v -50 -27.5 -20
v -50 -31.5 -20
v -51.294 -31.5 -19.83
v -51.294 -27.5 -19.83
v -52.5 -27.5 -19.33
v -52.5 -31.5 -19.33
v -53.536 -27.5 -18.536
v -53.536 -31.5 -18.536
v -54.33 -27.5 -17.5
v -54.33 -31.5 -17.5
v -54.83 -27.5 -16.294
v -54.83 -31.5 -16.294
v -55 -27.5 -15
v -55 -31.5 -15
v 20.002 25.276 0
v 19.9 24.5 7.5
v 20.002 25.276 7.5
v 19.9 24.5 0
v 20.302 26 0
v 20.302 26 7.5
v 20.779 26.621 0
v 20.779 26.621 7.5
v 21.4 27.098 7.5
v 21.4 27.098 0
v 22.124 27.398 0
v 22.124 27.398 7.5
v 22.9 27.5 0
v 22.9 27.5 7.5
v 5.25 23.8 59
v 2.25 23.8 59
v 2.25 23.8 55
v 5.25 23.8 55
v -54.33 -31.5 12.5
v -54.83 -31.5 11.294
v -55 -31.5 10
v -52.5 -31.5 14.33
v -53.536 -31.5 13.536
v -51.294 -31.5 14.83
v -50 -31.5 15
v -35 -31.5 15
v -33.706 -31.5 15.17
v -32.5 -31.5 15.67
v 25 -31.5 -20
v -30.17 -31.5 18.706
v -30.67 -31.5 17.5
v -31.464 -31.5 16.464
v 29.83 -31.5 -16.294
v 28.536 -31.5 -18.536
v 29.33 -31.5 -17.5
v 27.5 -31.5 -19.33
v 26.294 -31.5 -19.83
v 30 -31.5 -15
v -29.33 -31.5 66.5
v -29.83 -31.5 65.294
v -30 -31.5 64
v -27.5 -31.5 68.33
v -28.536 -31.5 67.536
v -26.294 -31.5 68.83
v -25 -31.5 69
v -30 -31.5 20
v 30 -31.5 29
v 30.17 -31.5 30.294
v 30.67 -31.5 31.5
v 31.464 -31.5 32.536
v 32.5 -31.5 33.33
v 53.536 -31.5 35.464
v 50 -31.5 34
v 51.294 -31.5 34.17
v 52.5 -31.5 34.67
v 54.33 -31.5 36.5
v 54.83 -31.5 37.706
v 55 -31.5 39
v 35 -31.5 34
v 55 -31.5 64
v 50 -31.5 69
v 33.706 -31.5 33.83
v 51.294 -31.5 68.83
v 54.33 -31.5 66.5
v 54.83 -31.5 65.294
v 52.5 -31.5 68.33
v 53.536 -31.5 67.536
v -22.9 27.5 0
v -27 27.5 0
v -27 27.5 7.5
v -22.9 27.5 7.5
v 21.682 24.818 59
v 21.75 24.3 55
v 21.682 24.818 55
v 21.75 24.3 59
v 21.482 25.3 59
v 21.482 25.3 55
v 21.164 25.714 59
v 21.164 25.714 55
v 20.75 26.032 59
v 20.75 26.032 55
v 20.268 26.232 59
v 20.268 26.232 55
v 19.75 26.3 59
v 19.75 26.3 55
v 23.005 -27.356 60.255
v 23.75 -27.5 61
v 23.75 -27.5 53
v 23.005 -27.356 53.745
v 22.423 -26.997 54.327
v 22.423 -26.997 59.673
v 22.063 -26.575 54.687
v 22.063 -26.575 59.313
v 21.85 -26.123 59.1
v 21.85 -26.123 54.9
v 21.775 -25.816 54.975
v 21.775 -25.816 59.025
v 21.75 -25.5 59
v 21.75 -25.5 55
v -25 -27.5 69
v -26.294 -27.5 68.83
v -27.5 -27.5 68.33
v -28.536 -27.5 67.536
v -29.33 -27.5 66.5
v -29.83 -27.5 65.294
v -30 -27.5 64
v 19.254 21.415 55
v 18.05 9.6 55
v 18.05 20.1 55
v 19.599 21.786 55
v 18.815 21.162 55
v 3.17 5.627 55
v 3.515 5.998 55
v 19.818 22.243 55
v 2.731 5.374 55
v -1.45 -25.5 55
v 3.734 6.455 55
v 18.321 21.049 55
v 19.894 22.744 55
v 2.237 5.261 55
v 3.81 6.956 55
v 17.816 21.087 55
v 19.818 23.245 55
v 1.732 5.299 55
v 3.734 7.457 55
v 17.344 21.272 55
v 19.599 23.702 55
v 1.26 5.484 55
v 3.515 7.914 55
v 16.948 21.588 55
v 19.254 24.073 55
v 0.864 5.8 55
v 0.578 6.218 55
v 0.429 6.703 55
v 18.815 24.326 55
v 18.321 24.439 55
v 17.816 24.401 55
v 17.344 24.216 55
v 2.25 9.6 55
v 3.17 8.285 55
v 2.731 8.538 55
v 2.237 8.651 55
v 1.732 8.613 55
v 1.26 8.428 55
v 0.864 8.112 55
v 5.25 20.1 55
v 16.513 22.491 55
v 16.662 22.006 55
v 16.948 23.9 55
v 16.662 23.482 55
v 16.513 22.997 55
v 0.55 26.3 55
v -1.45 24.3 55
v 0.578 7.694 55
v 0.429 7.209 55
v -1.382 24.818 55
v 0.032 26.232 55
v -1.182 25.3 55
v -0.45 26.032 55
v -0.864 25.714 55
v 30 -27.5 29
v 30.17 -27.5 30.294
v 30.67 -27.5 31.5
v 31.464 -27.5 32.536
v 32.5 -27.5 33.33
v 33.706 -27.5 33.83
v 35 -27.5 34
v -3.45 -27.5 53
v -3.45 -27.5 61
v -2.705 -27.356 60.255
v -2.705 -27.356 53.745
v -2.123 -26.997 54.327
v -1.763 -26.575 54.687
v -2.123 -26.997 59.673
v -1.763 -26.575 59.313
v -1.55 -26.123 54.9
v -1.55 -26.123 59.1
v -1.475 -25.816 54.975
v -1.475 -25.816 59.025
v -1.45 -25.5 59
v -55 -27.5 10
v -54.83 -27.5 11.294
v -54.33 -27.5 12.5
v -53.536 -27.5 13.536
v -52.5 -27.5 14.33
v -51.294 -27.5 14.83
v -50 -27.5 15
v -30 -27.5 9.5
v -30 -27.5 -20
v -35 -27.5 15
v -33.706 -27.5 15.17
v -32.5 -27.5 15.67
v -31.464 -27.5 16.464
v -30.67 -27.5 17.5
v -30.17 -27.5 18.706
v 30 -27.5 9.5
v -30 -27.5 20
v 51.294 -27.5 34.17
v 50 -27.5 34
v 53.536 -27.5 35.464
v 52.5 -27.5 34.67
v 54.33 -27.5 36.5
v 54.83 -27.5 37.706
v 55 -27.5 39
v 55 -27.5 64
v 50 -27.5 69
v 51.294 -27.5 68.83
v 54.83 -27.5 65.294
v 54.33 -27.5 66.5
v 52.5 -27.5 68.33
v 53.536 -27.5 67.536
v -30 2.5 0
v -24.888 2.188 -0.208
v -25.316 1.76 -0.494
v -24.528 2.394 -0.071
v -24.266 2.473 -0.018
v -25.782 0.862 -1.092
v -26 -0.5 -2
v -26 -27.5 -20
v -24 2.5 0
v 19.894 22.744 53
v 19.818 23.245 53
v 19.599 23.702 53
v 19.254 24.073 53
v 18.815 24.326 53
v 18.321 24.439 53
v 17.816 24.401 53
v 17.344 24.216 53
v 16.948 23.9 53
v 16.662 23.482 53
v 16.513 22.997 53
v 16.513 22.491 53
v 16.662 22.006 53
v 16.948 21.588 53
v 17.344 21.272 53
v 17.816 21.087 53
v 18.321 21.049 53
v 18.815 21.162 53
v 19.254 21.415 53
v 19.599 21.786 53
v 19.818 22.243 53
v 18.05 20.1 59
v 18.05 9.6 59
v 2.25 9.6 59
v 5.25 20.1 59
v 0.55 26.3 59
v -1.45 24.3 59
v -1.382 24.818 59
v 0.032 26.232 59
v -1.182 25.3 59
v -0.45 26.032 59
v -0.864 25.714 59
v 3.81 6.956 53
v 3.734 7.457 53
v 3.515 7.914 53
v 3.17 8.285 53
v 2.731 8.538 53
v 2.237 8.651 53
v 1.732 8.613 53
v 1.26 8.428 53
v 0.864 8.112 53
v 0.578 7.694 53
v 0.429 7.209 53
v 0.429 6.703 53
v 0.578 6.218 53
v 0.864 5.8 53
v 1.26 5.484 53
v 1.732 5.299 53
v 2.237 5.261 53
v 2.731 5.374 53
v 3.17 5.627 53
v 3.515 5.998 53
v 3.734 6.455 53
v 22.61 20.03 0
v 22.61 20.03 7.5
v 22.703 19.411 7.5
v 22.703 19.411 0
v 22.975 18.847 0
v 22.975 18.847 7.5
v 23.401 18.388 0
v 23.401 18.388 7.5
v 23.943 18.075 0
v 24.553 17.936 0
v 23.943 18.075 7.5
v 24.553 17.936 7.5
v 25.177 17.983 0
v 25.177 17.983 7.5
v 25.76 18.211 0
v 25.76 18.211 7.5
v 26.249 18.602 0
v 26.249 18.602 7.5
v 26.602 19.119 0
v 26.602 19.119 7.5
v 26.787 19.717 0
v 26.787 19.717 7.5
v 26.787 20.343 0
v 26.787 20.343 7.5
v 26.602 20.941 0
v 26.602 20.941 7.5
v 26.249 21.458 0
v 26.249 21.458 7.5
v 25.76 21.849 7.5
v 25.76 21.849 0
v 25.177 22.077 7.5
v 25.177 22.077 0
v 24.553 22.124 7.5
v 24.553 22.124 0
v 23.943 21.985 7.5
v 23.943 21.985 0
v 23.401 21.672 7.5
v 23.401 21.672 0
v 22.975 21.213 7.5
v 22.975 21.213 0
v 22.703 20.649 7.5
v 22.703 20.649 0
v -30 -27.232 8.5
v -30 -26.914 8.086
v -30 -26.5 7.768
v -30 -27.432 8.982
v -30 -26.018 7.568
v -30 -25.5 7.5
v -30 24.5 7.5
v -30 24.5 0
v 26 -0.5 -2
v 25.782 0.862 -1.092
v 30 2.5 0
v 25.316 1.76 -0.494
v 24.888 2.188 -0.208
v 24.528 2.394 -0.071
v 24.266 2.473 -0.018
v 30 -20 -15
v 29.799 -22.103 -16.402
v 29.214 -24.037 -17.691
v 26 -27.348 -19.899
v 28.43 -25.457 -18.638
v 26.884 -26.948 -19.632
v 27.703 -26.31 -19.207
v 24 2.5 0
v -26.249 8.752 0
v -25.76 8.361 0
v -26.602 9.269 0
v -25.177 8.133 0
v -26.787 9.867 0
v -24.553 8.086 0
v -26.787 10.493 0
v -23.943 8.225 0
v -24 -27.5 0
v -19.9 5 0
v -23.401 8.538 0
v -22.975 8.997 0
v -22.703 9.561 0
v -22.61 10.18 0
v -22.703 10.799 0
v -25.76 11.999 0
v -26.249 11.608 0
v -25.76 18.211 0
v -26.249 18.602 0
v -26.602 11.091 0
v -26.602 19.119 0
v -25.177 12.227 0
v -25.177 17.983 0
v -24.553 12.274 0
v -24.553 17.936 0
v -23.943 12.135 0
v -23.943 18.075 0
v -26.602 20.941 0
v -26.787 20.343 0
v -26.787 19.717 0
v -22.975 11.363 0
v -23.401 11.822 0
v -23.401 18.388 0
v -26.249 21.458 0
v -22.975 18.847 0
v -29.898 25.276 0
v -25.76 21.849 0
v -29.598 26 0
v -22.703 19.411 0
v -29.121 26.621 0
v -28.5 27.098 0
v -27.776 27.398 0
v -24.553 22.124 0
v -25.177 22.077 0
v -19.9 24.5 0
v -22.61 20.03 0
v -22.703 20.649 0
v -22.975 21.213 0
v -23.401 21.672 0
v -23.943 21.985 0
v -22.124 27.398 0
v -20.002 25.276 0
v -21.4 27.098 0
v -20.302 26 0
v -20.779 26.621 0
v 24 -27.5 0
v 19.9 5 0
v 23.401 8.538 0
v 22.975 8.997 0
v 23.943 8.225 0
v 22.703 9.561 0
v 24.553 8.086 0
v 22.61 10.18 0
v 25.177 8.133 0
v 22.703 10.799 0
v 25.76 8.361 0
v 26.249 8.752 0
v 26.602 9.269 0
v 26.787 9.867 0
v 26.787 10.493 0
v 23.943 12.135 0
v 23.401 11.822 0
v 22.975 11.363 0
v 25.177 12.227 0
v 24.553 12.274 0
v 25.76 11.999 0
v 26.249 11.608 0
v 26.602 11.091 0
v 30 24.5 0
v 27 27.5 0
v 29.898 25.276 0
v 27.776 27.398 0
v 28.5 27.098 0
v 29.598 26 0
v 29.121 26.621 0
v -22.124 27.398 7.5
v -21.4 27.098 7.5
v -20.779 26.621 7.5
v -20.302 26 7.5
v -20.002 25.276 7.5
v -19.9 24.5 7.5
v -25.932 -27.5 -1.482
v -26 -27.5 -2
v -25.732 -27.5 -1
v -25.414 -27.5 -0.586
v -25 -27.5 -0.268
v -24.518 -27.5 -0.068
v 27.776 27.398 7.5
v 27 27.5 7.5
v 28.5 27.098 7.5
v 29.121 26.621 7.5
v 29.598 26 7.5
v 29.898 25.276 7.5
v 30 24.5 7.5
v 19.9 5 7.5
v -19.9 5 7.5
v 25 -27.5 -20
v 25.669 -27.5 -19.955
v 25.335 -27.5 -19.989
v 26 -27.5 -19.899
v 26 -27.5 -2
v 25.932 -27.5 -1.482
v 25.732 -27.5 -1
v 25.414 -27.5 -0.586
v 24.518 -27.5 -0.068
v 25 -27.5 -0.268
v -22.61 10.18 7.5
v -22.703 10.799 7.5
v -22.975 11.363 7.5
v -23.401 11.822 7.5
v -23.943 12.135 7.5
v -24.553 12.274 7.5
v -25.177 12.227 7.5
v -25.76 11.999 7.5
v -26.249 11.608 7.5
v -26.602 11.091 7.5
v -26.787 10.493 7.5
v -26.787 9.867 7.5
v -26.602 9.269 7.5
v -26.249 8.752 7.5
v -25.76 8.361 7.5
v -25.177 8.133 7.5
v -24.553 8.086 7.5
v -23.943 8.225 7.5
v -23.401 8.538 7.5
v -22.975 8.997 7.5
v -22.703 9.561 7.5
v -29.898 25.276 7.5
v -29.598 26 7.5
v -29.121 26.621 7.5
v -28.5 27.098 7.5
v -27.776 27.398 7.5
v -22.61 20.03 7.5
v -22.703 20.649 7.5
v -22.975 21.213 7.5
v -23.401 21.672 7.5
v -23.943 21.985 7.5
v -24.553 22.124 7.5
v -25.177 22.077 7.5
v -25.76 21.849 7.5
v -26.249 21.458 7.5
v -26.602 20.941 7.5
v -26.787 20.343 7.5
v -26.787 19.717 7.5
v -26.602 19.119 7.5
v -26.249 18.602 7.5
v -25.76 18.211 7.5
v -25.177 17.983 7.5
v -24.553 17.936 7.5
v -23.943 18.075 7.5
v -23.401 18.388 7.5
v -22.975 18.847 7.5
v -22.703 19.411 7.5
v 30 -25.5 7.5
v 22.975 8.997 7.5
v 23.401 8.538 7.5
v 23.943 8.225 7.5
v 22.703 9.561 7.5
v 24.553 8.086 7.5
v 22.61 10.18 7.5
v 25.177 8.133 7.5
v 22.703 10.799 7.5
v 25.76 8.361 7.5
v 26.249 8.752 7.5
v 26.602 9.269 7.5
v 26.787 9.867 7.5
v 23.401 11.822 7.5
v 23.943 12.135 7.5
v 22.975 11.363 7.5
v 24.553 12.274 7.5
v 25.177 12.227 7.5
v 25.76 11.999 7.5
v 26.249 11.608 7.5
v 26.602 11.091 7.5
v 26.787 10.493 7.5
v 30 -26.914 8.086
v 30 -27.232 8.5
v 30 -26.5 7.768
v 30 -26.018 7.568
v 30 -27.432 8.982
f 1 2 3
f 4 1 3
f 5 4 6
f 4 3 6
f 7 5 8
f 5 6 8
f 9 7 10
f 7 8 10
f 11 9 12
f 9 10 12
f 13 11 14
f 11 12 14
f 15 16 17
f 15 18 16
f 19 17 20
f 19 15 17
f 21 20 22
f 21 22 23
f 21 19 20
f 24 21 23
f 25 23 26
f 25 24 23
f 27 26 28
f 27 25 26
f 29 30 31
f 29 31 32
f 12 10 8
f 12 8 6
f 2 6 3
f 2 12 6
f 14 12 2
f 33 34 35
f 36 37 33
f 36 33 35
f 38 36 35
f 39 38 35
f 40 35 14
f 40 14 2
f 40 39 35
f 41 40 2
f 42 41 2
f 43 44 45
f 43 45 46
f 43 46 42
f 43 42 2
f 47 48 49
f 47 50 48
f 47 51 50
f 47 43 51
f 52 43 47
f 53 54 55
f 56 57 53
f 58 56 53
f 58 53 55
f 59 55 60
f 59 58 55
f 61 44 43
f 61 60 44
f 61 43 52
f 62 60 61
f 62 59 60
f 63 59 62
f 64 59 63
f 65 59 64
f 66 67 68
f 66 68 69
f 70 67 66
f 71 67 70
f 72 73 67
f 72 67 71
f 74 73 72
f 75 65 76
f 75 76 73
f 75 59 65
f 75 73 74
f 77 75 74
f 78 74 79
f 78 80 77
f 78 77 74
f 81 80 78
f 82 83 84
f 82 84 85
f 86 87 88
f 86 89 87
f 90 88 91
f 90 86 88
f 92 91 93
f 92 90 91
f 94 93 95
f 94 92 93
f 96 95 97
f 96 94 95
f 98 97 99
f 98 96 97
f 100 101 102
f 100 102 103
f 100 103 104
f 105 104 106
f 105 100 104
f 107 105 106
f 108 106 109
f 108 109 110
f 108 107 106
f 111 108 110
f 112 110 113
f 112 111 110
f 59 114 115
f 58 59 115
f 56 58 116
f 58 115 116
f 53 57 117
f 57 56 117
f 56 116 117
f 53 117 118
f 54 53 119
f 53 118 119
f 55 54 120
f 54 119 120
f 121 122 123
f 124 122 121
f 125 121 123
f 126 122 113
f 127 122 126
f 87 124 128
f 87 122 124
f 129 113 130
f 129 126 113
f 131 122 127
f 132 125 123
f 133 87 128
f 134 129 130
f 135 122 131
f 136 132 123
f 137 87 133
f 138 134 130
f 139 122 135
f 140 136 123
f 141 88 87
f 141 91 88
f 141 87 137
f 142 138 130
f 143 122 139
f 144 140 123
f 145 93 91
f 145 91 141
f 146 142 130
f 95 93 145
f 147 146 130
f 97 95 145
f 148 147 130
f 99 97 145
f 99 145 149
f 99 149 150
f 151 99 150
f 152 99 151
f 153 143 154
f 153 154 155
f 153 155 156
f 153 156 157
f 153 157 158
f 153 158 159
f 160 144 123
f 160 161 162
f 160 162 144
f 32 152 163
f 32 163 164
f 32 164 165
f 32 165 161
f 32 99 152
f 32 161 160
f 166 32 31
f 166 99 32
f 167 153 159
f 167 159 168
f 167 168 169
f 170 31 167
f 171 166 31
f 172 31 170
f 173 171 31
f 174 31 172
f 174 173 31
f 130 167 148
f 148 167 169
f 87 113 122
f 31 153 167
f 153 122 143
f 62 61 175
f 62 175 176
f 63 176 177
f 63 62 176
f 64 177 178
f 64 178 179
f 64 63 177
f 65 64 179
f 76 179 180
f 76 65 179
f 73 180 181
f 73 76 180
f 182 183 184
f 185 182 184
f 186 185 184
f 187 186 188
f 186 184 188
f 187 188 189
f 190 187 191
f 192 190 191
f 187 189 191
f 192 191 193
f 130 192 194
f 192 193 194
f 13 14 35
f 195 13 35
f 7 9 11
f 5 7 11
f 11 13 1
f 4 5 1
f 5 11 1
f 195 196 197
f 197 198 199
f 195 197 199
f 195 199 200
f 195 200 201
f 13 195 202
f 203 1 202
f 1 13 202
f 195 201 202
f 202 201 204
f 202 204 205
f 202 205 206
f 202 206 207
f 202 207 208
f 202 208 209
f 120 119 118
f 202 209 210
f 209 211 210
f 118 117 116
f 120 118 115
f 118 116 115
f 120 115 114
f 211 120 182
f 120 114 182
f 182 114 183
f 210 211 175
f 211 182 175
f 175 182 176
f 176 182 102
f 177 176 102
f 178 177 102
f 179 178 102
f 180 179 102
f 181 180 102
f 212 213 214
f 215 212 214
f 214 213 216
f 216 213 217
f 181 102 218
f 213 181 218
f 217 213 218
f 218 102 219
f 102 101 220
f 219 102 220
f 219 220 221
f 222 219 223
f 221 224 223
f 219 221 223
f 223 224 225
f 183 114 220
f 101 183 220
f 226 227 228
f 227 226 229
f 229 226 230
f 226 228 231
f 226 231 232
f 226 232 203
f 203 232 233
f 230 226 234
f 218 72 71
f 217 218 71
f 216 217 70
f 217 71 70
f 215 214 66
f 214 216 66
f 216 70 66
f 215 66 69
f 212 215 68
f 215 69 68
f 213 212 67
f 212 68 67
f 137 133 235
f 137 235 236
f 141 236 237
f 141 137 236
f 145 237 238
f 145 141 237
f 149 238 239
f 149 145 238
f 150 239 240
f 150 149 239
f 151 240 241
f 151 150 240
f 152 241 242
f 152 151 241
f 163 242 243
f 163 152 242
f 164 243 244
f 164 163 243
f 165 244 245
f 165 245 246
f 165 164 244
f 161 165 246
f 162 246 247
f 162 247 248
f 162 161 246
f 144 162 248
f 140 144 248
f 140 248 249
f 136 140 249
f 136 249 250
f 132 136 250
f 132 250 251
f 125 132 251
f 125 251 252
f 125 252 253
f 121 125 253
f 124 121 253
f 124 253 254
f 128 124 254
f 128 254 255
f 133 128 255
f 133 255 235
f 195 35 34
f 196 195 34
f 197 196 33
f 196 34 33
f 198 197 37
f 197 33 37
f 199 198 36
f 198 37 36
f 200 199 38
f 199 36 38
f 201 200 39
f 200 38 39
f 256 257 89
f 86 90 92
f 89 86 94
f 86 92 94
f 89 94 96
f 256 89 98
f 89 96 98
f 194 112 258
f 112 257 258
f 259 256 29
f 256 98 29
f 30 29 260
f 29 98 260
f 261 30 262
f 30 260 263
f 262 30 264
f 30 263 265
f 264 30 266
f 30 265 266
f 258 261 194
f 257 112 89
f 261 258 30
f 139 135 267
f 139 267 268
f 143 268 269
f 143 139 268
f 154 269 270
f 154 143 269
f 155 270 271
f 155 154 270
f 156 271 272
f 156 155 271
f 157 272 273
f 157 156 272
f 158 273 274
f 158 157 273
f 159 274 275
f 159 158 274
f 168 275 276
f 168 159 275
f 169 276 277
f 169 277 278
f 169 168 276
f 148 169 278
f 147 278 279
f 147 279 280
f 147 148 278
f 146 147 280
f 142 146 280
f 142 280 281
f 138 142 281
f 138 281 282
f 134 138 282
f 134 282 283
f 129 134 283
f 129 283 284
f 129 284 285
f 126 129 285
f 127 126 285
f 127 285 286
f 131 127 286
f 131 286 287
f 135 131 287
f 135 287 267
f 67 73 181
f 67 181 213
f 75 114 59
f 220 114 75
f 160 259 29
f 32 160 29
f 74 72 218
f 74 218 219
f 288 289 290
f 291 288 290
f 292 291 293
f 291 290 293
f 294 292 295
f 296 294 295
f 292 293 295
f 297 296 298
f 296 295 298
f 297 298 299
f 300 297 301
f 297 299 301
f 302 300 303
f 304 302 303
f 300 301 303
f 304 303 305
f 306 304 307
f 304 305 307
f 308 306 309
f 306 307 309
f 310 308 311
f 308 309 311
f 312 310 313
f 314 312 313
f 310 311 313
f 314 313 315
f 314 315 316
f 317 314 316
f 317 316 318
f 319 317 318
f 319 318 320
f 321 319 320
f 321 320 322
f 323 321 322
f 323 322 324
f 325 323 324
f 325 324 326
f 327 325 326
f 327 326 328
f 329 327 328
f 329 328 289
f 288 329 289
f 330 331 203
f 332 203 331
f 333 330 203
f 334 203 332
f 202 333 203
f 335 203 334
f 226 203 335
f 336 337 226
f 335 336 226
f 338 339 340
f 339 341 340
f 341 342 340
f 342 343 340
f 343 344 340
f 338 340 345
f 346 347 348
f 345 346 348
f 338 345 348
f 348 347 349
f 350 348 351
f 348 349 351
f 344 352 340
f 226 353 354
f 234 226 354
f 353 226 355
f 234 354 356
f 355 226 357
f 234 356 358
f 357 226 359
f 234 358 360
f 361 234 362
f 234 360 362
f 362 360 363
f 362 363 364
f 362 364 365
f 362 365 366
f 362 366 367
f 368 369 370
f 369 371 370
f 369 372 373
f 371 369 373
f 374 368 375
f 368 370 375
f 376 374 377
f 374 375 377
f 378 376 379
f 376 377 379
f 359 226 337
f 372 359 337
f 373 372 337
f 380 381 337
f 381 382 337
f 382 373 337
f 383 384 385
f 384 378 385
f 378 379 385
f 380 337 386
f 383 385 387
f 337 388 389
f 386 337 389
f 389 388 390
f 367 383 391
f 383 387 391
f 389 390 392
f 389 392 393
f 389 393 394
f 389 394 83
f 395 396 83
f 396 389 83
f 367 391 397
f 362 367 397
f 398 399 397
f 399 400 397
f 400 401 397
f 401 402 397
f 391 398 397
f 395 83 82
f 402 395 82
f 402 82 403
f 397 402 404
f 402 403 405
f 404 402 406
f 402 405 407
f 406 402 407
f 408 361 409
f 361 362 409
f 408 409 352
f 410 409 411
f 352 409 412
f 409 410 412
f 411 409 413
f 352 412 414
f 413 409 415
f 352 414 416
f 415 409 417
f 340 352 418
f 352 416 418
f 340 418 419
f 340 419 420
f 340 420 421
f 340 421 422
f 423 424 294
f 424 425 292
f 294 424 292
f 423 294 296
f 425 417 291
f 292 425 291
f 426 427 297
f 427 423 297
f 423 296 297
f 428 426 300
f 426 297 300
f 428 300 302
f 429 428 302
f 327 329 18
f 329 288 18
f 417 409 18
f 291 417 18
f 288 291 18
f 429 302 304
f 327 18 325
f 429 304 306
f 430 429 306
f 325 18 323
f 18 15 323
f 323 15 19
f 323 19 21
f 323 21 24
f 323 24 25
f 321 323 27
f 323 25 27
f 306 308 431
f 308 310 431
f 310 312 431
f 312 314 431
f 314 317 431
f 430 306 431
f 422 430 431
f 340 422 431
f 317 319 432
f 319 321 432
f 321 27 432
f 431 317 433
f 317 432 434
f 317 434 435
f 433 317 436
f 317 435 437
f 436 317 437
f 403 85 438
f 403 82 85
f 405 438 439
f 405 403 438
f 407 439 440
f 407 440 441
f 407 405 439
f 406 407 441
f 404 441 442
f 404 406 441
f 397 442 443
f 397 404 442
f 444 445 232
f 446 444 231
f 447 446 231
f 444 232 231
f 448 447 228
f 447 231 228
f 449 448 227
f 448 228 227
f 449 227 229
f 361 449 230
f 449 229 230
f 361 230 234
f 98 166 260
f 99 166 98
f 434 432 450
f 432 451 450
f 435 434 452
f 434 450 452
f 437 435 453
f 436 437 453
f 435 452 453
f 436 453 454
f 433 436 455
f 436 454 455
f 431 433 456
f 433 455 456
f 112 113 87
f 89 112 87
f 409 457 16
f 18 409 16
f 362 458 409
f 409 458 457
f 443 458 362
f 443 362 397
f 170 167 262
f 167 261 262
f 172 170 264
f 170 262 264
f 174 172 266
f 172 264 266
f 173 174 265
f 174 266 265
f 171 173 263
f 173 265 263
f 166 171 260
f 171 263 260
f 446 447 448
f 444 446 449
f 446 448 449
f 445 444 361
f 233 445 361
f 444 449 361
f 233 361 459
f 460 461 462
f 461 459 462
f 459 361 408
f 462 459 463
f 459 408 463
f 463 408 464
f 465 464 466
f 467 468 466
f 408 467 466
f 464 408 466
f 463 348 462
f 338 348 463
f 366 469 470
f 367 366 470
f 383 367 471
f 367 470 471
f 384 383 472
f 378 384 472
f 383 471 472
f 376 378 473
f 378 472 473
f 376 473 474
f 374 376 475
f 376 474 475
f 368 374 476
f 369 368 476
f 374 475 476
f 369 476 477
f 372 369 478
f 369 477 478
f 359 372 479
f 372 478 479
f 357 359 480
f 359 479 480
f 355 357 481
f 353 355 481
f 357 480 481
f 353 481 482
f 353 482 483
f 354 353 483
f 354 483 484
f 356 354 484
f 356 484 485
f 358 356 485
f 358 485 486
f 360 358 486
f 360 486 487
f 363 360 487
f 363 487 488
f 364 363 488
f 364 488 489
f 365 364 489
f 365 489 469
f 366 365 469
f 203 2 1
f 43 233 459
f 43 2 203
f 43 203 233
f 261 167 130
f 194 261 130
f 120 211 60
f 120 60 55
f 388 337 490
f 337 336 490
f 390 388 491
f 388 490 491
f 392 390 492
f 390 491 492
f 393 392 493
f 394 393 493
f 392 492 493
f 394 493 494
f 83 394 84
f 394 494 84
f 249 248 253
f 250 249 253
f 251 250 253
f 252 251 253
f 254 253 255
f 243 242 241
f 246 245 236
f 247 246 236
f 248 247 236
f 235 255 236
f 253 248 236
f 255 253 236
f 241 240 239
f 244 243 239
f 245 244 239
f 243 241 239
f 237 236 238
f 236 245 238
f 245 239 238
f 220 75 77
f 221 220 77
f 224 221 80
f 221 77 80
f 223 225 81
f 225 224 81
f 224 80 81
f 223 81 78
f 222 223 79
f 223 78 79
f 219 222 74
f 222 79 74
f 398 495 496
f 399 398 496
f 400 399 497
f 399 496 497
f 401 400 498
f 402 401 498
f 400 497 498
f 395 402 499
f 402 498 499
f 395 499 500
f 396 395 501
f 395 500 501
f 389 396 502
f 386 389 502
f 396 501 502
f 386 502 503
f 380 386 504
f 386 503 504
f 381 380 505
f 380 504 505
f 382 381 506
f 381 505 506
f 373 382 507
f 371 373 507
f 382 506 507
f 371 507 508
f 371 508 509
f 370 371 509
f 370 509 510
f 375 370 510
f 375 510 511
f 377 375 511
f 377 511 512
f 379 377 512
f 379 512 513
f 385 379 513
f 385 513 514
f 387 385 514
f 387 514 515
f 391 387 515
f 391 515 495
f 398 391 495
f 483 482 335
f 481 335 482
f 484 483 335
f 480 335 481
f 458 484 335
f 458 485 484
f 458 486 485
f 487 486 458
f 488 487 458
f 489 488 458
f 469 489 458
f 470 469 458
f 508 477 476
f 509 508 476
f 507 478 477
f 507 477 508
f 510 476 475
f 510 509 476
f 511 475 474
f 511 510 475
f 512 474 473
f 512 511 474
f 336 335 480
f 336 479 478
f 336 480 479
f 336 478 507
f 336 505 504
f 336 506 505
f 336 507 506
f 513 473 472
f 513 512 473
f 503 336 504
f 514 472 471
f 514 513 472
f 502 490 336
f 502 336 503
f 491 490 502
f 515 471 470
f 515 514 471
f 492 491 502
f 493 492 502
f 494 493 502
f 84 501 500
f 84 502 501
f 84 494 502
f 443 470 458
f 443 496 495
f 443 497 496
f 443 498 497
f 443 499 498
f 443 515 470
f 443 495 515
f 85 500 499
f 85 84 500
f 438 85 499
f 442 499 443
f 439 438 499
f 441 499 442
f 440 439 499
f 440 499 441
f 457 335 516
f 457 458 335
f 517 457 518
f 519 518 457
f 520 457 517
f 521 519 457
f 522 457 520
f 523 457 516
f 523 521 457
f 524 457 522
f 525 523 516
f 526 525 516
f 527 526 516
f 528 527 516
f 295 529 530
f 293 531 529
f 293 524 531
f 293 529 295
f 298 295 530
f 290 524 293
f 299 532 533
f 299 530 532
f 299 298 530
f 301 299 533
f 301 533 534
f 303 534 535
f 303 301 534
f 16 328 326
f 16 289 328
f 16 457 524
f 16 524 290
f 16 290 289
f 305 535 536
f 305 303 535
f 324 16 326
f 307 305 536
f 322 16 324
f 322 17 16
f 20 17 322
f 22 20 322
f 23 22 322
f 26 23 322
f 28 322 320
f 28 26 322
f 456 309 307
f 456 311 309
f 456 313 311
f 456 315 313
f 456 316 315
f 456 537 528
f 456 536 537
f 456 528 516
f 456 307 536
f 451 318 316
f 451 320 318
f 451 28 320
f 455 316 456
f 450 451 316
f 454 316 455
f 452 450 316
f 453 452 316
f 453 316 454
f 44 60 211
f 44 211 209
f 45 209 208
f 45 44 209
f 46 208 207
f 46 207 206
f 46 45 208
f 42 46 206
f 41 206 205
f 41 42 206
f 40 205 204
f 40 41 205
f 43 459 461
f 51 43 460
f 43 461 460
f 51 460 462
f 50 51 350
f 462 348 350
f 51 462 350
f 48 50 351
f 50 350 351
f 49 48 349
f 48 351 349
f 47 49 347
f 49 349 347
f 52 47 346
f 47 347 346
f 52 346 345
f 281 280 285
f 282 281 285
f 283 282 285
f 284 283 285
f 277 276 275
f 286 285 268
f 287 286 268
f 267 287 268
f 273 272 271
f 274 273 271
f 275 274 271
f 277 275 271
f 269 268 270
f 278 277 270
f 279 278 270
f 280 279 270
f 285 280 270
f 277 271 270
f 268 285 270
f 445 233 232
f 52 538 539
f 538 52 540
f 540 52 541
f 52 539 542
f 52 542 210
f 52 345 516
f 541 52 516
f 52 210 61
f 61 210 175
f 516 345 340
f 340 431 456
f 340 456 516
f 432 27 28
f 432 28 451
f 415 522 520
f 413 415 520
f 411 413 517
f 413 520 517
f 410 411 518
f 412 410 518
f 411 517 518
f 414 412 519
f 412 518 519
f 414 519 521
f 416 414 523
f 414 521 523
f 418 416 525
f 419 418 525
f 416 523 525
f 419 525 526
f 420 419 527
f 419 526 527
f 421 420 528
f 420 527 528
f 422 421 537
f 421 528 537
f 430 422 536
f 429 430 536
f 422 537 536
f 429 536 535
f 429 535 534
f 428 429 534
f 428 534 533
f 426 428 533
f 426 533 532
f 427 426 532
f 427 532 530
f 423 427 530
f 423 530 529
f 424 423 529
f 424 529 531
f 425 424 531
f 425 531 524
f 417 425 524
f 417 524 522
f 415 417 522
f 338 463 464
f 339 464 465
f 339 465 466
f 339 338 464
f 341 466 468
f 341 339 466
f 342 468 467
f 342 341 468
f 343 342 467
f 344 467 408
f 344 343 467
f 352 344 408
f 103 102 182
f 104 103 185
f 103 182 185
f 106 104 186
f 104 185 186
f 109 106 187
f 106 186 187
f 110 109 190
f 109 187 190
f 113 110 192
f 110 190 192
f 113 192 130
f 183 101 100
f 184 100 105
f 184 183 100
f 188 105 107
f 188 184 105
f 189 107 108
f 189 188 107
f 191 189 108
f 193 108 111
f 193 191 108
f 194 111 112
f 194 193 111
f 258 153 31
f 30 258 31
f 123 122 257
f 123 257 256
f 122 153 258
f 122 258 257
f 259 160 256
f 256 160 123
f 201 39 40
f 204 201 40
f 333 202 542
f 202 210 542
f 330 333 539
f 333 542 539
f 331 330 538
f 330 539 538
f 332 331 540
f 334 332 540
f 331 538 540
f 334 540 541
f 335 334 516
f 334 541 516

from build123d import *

# Parameters (mm, degrees)
SKETCH2_W                = 60
SKETCH2_H                = 55
BOSS_EXTRUDE1_DEPTH      = 7.5
SKETCH3_W                = 39.8
SKETCH3_H                = 45
CUT_EXTRUDE1_DEPTH       = 42.382363393
SKETCH4_R                = 2.1
CUT_EXTRUDE2_DEPTH       = 42.382363393
BOSS_EXTRUDE2_DEPTH      = 3
BOSS_EXTRUDE2_DEPTH_BACK = 1
SKETCH6_R                = 1.7
SKETCH6_W                = 15.8
SKETCH6_H                = 10.5
SKETCH7_W                = 3
SKETCH7_H                = 3.7
CUT_EXTRUDE3_DEPTH       = 4
SKETCH8_R                = 1.7
BOSS_EXTRUDE4_DEPTH      = 6
SKETCH10_W               = 60
SKETCH10_H               = 89
BOSS_EXTRUDE5_DEPTH      = 4
BOSS_EXTRUDE6_DEPTH      = 4
LPATTERN1_COUNT          = 2
LPATTERN1_PITCH          = 56
FILLET1_R                = 3
FILLET3_R                = 2
FILLET4_R                = 2
FILLET5_R                = 2
FILLET6_R                = 2
FILLET7_R                = 2
FILLET8_R                = 2
FILLET9_R                = 2
FILLET10_R               = 2
SKETCH12_W               = 25
SKETCH12_H               = 35
BOSS_EXTRUDE7_DEPTH      = 4
FILLET11_R               = 5


with BuildPart() as part:
    # Sketch2 → Boss-Extrude1 (new body)
    with BuildSketch(Plane.XY):
        Rectangle(SKETCH2_W, SKETCH2_H)
    extrude(amount=BOSS_EXTRUDE1_DEPTH)

    # Sketch3 → Cut-Extrude1 (cut, through all)
    with BuildSketch(Plane.XY.offset(7.5)):
        with Locations((0, 27.5)):
            Rectangle(SKETCH3_W, SKETCH3_H)
    extrude(amount=-CUT_EXTRUDE1_DEPTH, mode=Mode.SUBTRACT)

    # Sketch4 → Cut-Extrude2 (cut, through all)
    with BuildSketch(Plane.XY.offset(7.5)):
        with Locations((-24.71, 20.03)):
            Circle(SKETCH4_R)
        with Locations((-24.71, 10.18)):
            Circle(SKETCH4_R)
        with Locations(Location((24.71, 20.03, 0), (0, 0, 180))):
            Circle(SKETCH4_R)
        with Locations(Location((24.71, 10.18, 0), (0, 0, 180))):
            Circle(SKETCH4_R)
    extrude(amount=-CUT_EXTRUDE2_DEPTH, mode=Mode.SUBTRACT)



with BuildPart() as body_2:
    # Sketch6 → Boss-Extrude2 (new, two sides: drawn at the far end of the back side and taken through both)
    with BuildSketch(Plane.XY.offset(56).offset(-BOSS_EXTRUDE2_DEPTH_BACK)):
        Polygon((-1.45, 3.4), (-1.45, 26.3), (21.75, 26.3), (21.75, 3.4), (21.75, -27.5), (-1.45, -27.5), align=None)
        with Locations((18.194, 22.744)):
            Circle(SKETCH6_R, mode=Mode.SUBTRACT)
        with Locations((2.11, 6.956)):
            Circle(SKETCH6_R, mode=Mode.SUBTRACT)
        with Locations((10.15, 14.85)):
            Rectangle(SKETCH6_W, SKETCH6_H, mode=Mode.SUBTRACT)
    extrude(amount=BOSS_EXTRUDE2_DEPTH + BOSS_EXTRUDE2_DEPTH_BACK)

    # Sketch7 → Cut-Extrude3 (cut)
    with BuildSketch(Plane.XY.offset(59)):
        with Locations((3.75, 21.95)):
            Rectangle(SKETCH7_W, SKETCH7_H)
    extrude(amount=-CUT_EXTRUDE3_DEPTH, mode=Mode.SUBTRACT)

    # Sketch8 → Boss-Extrude4 (add)
    with BuildSketch(Plane.XY.offset(59)):
        with Locations((18.194, 22.744)):
            Circle(SKETCH8_R)
        with Locations((2.11, 6.956)):
            Circle(SKETCH8_R)
    extrude(amount=-BOSS_EXTRUDE4_DEPTH)


with BuildPart() as part_1:
    add(part.part)

    add(body_2.part)  # Boss-Extrude5 merges body 2
    # Sketch10 → Boss-Extrude5 (add)
    with BuildSketch(Plane.XZ.offset(27.5)):
        with Locations((0, 24.5)):
            Rectangle(SKETCH10_W, SKETCH10_H)
    extrude(amount=BOSS_EXTRUDE5_DEPTH)

    # Sketch11 → Boss-Extrude6 (add)
    with BuildSketch(Plane(origin=(30, 0, 0), x_dir=(0, 0, -1), z_dir=(1, 0, 0))):
        Polygon((0, 2.5), (20, -27.5), (0, -27.5), align=None)
    boss_extrude6 = extrude(amount=-BOSS_EXTRUDE6_DEPTH)

    # LPattern1: Boss-Extrude6 ×2
    with Locations(*[(-i * LPATTERN1_PITCH, 0, 0) for i in range(1, LPATTERN1_COUNT)]):
        add(boss_extrude6)

    # Fillet1
    fillet1_edges = [part_1.edges().sort_by_distance(p)[0] for p in [
        (19.9, 27.5, 3.75),
        (-19.9, 27.5, 3.75),
        (-30, 27.5, 3.75),
        (30, 27.5, 3.75),
    ]]
    fillet(fillet1_edges, radius=FILLET1_R)

    # Fillet3
    fillet3_edges = [part_1.edges().sort_by_distance(p)[0] for p in [
        (21.75, 26.3, 57),
        (-1.45, 26.3, 57),
    ]]
    fillet(fillet3_edges, radius=FILLET3_R)

    # Fillet4
    fillet4_edges = [part_1.edges().sort_by_distance(p)[0] for p in [
        (-1.45, -27.5, 57),
    ]]
    fillet(fillet4_edges, radius=FILLET4_R)

    # Fillet5
    fillet5_edges = [part_1.edges().sort_by_distance(p)[0] for p in [
        (21.75, -27.5, 57),
    ]]
    fillet(fillet5_edges, radius=FILLET5_R)

    # Fillet6
    fillet6_edges = [part_1.edges().sort_by_distance(p)[0] for p in [
        (0, -27.5, 7.5),
    ]]
    fillet(fillet6_edges, radius=FILLET6_R)

    # Fillet7
    fillet7_edges = [part_1.edges().sort_by_distance(p)[0] for p in [
        (10.15, -27.5, 55),
    ]]
    fillet(fillet7_edges, radius=FILLET7_R)

    # Fillet8
    fillet8_edges = [part_1.edges().sort_by_distance(p)[0] for p in [
        (10.15, -27.5, 59),
    ]]
    fillet(fillet8_edges, radius=FILLET8_R)

    # Fillet9
    fillet9_edges = [part_1.edges().sort_by_distance(p)[0] for p in [
        (26, -12.5, 0),
    ]]
    fillet(fillet9_edges, radius=FILLET9_R)

    # Fillet10
    fillet10_edges = [part_1.edges().sort_by_distance(p)[0] for p in [
        (-26, -12.5, 0),
    ]]
    fillet(fillet10_edges, radius=FILLET10_R)

    # Sketch12 → Boss-Extrude7 (add)
    with BuildSketch(Plane.XZ.offset(31.5)):
        with Locations((-42.5, -2.5)):
            Rectangle(SKETCH12_W, SKETCH12_H)
        with Locations((42.5, 51.5)):
            Rectangle(SKETCH12_W, SKETCH12_H)
    extrude(amount=-BOSS_EXTRUDE7_DEPTH)

    # Fillet11
    # the kernel refuses this fillet: 5 mm, written as the material it adds along each edge
    with BuildSketch(Plane(origin=(-30, -31.5, 15), x_dir=(-1, 0, 0), z_dir=(0, 1, 0)), Plane(origin=(30, -31.5, 34), x_dir=(1, 0, 0), z_dir=(0, 1, 0))) as fillet11_piece_1:
        with BuildLine():
            CenterArc((FILLET11_R, FILLET11_R), FILLET11_R, 180, 90)
            Line((0, FILLET11_R), (0, 0))
            Line((0, 0), (FILLET11_R, 0))
        make_face()
    extrude(amount=4)
    # the kernel refuses this fillet: 5 mm, written as the material it takes off along each edge
    with BuildSketch(Plane(origin=(-55, -44, 15), x_dir=(0, 0, -1), z_dir=(0, 1, 0)), Plane(origin=(-55, -44, -20), x_dir=(1, 0, 0), z_dir=(0, 1, 0)), Plane(origin=(30, -15, -20), x_dir=(-1, 0, 0), z_dir=(0, -1, 0))) as fillet11_2_piece_1:
        with BuildLine():
            CenterArc((FILLET11_R, -FILLET11_R), FILLET11_R, 90, 90)
            Line((0, -FILLET11_R), (0, 0))
            Line((0, 0), (FILLET11_R, 0))
        make_face()
    extrude(amount=29, mode=Mode.SUBTRACT)
    with BuildSketch(Plane(origin=(55, -44, 34), x_dir=(-1, 0, 0), z_dir=(0, 1, 0)), Plane(origin=(55, -44, 69), x_dir=(0, 0, -1), z_dir=(0, 1, 0)), Plane(origin=(-30, -15, 69), x_dir=(0, 0, -1), z_dir=(0, -1, 0))) as fillet11_2_piece_2:
        with BuildLine():
            CenterArc((FILLET11_R, FILLET11_R), FILLET11_R, 180, 90)
            Line((0, FILLET11_R), (0, 0))
            Line((0, 0), (FILLET11_R, 0))
        make_face()
    extrude(amount=29, mode=Mode.SUBTRACT)


solid = part_1.part
